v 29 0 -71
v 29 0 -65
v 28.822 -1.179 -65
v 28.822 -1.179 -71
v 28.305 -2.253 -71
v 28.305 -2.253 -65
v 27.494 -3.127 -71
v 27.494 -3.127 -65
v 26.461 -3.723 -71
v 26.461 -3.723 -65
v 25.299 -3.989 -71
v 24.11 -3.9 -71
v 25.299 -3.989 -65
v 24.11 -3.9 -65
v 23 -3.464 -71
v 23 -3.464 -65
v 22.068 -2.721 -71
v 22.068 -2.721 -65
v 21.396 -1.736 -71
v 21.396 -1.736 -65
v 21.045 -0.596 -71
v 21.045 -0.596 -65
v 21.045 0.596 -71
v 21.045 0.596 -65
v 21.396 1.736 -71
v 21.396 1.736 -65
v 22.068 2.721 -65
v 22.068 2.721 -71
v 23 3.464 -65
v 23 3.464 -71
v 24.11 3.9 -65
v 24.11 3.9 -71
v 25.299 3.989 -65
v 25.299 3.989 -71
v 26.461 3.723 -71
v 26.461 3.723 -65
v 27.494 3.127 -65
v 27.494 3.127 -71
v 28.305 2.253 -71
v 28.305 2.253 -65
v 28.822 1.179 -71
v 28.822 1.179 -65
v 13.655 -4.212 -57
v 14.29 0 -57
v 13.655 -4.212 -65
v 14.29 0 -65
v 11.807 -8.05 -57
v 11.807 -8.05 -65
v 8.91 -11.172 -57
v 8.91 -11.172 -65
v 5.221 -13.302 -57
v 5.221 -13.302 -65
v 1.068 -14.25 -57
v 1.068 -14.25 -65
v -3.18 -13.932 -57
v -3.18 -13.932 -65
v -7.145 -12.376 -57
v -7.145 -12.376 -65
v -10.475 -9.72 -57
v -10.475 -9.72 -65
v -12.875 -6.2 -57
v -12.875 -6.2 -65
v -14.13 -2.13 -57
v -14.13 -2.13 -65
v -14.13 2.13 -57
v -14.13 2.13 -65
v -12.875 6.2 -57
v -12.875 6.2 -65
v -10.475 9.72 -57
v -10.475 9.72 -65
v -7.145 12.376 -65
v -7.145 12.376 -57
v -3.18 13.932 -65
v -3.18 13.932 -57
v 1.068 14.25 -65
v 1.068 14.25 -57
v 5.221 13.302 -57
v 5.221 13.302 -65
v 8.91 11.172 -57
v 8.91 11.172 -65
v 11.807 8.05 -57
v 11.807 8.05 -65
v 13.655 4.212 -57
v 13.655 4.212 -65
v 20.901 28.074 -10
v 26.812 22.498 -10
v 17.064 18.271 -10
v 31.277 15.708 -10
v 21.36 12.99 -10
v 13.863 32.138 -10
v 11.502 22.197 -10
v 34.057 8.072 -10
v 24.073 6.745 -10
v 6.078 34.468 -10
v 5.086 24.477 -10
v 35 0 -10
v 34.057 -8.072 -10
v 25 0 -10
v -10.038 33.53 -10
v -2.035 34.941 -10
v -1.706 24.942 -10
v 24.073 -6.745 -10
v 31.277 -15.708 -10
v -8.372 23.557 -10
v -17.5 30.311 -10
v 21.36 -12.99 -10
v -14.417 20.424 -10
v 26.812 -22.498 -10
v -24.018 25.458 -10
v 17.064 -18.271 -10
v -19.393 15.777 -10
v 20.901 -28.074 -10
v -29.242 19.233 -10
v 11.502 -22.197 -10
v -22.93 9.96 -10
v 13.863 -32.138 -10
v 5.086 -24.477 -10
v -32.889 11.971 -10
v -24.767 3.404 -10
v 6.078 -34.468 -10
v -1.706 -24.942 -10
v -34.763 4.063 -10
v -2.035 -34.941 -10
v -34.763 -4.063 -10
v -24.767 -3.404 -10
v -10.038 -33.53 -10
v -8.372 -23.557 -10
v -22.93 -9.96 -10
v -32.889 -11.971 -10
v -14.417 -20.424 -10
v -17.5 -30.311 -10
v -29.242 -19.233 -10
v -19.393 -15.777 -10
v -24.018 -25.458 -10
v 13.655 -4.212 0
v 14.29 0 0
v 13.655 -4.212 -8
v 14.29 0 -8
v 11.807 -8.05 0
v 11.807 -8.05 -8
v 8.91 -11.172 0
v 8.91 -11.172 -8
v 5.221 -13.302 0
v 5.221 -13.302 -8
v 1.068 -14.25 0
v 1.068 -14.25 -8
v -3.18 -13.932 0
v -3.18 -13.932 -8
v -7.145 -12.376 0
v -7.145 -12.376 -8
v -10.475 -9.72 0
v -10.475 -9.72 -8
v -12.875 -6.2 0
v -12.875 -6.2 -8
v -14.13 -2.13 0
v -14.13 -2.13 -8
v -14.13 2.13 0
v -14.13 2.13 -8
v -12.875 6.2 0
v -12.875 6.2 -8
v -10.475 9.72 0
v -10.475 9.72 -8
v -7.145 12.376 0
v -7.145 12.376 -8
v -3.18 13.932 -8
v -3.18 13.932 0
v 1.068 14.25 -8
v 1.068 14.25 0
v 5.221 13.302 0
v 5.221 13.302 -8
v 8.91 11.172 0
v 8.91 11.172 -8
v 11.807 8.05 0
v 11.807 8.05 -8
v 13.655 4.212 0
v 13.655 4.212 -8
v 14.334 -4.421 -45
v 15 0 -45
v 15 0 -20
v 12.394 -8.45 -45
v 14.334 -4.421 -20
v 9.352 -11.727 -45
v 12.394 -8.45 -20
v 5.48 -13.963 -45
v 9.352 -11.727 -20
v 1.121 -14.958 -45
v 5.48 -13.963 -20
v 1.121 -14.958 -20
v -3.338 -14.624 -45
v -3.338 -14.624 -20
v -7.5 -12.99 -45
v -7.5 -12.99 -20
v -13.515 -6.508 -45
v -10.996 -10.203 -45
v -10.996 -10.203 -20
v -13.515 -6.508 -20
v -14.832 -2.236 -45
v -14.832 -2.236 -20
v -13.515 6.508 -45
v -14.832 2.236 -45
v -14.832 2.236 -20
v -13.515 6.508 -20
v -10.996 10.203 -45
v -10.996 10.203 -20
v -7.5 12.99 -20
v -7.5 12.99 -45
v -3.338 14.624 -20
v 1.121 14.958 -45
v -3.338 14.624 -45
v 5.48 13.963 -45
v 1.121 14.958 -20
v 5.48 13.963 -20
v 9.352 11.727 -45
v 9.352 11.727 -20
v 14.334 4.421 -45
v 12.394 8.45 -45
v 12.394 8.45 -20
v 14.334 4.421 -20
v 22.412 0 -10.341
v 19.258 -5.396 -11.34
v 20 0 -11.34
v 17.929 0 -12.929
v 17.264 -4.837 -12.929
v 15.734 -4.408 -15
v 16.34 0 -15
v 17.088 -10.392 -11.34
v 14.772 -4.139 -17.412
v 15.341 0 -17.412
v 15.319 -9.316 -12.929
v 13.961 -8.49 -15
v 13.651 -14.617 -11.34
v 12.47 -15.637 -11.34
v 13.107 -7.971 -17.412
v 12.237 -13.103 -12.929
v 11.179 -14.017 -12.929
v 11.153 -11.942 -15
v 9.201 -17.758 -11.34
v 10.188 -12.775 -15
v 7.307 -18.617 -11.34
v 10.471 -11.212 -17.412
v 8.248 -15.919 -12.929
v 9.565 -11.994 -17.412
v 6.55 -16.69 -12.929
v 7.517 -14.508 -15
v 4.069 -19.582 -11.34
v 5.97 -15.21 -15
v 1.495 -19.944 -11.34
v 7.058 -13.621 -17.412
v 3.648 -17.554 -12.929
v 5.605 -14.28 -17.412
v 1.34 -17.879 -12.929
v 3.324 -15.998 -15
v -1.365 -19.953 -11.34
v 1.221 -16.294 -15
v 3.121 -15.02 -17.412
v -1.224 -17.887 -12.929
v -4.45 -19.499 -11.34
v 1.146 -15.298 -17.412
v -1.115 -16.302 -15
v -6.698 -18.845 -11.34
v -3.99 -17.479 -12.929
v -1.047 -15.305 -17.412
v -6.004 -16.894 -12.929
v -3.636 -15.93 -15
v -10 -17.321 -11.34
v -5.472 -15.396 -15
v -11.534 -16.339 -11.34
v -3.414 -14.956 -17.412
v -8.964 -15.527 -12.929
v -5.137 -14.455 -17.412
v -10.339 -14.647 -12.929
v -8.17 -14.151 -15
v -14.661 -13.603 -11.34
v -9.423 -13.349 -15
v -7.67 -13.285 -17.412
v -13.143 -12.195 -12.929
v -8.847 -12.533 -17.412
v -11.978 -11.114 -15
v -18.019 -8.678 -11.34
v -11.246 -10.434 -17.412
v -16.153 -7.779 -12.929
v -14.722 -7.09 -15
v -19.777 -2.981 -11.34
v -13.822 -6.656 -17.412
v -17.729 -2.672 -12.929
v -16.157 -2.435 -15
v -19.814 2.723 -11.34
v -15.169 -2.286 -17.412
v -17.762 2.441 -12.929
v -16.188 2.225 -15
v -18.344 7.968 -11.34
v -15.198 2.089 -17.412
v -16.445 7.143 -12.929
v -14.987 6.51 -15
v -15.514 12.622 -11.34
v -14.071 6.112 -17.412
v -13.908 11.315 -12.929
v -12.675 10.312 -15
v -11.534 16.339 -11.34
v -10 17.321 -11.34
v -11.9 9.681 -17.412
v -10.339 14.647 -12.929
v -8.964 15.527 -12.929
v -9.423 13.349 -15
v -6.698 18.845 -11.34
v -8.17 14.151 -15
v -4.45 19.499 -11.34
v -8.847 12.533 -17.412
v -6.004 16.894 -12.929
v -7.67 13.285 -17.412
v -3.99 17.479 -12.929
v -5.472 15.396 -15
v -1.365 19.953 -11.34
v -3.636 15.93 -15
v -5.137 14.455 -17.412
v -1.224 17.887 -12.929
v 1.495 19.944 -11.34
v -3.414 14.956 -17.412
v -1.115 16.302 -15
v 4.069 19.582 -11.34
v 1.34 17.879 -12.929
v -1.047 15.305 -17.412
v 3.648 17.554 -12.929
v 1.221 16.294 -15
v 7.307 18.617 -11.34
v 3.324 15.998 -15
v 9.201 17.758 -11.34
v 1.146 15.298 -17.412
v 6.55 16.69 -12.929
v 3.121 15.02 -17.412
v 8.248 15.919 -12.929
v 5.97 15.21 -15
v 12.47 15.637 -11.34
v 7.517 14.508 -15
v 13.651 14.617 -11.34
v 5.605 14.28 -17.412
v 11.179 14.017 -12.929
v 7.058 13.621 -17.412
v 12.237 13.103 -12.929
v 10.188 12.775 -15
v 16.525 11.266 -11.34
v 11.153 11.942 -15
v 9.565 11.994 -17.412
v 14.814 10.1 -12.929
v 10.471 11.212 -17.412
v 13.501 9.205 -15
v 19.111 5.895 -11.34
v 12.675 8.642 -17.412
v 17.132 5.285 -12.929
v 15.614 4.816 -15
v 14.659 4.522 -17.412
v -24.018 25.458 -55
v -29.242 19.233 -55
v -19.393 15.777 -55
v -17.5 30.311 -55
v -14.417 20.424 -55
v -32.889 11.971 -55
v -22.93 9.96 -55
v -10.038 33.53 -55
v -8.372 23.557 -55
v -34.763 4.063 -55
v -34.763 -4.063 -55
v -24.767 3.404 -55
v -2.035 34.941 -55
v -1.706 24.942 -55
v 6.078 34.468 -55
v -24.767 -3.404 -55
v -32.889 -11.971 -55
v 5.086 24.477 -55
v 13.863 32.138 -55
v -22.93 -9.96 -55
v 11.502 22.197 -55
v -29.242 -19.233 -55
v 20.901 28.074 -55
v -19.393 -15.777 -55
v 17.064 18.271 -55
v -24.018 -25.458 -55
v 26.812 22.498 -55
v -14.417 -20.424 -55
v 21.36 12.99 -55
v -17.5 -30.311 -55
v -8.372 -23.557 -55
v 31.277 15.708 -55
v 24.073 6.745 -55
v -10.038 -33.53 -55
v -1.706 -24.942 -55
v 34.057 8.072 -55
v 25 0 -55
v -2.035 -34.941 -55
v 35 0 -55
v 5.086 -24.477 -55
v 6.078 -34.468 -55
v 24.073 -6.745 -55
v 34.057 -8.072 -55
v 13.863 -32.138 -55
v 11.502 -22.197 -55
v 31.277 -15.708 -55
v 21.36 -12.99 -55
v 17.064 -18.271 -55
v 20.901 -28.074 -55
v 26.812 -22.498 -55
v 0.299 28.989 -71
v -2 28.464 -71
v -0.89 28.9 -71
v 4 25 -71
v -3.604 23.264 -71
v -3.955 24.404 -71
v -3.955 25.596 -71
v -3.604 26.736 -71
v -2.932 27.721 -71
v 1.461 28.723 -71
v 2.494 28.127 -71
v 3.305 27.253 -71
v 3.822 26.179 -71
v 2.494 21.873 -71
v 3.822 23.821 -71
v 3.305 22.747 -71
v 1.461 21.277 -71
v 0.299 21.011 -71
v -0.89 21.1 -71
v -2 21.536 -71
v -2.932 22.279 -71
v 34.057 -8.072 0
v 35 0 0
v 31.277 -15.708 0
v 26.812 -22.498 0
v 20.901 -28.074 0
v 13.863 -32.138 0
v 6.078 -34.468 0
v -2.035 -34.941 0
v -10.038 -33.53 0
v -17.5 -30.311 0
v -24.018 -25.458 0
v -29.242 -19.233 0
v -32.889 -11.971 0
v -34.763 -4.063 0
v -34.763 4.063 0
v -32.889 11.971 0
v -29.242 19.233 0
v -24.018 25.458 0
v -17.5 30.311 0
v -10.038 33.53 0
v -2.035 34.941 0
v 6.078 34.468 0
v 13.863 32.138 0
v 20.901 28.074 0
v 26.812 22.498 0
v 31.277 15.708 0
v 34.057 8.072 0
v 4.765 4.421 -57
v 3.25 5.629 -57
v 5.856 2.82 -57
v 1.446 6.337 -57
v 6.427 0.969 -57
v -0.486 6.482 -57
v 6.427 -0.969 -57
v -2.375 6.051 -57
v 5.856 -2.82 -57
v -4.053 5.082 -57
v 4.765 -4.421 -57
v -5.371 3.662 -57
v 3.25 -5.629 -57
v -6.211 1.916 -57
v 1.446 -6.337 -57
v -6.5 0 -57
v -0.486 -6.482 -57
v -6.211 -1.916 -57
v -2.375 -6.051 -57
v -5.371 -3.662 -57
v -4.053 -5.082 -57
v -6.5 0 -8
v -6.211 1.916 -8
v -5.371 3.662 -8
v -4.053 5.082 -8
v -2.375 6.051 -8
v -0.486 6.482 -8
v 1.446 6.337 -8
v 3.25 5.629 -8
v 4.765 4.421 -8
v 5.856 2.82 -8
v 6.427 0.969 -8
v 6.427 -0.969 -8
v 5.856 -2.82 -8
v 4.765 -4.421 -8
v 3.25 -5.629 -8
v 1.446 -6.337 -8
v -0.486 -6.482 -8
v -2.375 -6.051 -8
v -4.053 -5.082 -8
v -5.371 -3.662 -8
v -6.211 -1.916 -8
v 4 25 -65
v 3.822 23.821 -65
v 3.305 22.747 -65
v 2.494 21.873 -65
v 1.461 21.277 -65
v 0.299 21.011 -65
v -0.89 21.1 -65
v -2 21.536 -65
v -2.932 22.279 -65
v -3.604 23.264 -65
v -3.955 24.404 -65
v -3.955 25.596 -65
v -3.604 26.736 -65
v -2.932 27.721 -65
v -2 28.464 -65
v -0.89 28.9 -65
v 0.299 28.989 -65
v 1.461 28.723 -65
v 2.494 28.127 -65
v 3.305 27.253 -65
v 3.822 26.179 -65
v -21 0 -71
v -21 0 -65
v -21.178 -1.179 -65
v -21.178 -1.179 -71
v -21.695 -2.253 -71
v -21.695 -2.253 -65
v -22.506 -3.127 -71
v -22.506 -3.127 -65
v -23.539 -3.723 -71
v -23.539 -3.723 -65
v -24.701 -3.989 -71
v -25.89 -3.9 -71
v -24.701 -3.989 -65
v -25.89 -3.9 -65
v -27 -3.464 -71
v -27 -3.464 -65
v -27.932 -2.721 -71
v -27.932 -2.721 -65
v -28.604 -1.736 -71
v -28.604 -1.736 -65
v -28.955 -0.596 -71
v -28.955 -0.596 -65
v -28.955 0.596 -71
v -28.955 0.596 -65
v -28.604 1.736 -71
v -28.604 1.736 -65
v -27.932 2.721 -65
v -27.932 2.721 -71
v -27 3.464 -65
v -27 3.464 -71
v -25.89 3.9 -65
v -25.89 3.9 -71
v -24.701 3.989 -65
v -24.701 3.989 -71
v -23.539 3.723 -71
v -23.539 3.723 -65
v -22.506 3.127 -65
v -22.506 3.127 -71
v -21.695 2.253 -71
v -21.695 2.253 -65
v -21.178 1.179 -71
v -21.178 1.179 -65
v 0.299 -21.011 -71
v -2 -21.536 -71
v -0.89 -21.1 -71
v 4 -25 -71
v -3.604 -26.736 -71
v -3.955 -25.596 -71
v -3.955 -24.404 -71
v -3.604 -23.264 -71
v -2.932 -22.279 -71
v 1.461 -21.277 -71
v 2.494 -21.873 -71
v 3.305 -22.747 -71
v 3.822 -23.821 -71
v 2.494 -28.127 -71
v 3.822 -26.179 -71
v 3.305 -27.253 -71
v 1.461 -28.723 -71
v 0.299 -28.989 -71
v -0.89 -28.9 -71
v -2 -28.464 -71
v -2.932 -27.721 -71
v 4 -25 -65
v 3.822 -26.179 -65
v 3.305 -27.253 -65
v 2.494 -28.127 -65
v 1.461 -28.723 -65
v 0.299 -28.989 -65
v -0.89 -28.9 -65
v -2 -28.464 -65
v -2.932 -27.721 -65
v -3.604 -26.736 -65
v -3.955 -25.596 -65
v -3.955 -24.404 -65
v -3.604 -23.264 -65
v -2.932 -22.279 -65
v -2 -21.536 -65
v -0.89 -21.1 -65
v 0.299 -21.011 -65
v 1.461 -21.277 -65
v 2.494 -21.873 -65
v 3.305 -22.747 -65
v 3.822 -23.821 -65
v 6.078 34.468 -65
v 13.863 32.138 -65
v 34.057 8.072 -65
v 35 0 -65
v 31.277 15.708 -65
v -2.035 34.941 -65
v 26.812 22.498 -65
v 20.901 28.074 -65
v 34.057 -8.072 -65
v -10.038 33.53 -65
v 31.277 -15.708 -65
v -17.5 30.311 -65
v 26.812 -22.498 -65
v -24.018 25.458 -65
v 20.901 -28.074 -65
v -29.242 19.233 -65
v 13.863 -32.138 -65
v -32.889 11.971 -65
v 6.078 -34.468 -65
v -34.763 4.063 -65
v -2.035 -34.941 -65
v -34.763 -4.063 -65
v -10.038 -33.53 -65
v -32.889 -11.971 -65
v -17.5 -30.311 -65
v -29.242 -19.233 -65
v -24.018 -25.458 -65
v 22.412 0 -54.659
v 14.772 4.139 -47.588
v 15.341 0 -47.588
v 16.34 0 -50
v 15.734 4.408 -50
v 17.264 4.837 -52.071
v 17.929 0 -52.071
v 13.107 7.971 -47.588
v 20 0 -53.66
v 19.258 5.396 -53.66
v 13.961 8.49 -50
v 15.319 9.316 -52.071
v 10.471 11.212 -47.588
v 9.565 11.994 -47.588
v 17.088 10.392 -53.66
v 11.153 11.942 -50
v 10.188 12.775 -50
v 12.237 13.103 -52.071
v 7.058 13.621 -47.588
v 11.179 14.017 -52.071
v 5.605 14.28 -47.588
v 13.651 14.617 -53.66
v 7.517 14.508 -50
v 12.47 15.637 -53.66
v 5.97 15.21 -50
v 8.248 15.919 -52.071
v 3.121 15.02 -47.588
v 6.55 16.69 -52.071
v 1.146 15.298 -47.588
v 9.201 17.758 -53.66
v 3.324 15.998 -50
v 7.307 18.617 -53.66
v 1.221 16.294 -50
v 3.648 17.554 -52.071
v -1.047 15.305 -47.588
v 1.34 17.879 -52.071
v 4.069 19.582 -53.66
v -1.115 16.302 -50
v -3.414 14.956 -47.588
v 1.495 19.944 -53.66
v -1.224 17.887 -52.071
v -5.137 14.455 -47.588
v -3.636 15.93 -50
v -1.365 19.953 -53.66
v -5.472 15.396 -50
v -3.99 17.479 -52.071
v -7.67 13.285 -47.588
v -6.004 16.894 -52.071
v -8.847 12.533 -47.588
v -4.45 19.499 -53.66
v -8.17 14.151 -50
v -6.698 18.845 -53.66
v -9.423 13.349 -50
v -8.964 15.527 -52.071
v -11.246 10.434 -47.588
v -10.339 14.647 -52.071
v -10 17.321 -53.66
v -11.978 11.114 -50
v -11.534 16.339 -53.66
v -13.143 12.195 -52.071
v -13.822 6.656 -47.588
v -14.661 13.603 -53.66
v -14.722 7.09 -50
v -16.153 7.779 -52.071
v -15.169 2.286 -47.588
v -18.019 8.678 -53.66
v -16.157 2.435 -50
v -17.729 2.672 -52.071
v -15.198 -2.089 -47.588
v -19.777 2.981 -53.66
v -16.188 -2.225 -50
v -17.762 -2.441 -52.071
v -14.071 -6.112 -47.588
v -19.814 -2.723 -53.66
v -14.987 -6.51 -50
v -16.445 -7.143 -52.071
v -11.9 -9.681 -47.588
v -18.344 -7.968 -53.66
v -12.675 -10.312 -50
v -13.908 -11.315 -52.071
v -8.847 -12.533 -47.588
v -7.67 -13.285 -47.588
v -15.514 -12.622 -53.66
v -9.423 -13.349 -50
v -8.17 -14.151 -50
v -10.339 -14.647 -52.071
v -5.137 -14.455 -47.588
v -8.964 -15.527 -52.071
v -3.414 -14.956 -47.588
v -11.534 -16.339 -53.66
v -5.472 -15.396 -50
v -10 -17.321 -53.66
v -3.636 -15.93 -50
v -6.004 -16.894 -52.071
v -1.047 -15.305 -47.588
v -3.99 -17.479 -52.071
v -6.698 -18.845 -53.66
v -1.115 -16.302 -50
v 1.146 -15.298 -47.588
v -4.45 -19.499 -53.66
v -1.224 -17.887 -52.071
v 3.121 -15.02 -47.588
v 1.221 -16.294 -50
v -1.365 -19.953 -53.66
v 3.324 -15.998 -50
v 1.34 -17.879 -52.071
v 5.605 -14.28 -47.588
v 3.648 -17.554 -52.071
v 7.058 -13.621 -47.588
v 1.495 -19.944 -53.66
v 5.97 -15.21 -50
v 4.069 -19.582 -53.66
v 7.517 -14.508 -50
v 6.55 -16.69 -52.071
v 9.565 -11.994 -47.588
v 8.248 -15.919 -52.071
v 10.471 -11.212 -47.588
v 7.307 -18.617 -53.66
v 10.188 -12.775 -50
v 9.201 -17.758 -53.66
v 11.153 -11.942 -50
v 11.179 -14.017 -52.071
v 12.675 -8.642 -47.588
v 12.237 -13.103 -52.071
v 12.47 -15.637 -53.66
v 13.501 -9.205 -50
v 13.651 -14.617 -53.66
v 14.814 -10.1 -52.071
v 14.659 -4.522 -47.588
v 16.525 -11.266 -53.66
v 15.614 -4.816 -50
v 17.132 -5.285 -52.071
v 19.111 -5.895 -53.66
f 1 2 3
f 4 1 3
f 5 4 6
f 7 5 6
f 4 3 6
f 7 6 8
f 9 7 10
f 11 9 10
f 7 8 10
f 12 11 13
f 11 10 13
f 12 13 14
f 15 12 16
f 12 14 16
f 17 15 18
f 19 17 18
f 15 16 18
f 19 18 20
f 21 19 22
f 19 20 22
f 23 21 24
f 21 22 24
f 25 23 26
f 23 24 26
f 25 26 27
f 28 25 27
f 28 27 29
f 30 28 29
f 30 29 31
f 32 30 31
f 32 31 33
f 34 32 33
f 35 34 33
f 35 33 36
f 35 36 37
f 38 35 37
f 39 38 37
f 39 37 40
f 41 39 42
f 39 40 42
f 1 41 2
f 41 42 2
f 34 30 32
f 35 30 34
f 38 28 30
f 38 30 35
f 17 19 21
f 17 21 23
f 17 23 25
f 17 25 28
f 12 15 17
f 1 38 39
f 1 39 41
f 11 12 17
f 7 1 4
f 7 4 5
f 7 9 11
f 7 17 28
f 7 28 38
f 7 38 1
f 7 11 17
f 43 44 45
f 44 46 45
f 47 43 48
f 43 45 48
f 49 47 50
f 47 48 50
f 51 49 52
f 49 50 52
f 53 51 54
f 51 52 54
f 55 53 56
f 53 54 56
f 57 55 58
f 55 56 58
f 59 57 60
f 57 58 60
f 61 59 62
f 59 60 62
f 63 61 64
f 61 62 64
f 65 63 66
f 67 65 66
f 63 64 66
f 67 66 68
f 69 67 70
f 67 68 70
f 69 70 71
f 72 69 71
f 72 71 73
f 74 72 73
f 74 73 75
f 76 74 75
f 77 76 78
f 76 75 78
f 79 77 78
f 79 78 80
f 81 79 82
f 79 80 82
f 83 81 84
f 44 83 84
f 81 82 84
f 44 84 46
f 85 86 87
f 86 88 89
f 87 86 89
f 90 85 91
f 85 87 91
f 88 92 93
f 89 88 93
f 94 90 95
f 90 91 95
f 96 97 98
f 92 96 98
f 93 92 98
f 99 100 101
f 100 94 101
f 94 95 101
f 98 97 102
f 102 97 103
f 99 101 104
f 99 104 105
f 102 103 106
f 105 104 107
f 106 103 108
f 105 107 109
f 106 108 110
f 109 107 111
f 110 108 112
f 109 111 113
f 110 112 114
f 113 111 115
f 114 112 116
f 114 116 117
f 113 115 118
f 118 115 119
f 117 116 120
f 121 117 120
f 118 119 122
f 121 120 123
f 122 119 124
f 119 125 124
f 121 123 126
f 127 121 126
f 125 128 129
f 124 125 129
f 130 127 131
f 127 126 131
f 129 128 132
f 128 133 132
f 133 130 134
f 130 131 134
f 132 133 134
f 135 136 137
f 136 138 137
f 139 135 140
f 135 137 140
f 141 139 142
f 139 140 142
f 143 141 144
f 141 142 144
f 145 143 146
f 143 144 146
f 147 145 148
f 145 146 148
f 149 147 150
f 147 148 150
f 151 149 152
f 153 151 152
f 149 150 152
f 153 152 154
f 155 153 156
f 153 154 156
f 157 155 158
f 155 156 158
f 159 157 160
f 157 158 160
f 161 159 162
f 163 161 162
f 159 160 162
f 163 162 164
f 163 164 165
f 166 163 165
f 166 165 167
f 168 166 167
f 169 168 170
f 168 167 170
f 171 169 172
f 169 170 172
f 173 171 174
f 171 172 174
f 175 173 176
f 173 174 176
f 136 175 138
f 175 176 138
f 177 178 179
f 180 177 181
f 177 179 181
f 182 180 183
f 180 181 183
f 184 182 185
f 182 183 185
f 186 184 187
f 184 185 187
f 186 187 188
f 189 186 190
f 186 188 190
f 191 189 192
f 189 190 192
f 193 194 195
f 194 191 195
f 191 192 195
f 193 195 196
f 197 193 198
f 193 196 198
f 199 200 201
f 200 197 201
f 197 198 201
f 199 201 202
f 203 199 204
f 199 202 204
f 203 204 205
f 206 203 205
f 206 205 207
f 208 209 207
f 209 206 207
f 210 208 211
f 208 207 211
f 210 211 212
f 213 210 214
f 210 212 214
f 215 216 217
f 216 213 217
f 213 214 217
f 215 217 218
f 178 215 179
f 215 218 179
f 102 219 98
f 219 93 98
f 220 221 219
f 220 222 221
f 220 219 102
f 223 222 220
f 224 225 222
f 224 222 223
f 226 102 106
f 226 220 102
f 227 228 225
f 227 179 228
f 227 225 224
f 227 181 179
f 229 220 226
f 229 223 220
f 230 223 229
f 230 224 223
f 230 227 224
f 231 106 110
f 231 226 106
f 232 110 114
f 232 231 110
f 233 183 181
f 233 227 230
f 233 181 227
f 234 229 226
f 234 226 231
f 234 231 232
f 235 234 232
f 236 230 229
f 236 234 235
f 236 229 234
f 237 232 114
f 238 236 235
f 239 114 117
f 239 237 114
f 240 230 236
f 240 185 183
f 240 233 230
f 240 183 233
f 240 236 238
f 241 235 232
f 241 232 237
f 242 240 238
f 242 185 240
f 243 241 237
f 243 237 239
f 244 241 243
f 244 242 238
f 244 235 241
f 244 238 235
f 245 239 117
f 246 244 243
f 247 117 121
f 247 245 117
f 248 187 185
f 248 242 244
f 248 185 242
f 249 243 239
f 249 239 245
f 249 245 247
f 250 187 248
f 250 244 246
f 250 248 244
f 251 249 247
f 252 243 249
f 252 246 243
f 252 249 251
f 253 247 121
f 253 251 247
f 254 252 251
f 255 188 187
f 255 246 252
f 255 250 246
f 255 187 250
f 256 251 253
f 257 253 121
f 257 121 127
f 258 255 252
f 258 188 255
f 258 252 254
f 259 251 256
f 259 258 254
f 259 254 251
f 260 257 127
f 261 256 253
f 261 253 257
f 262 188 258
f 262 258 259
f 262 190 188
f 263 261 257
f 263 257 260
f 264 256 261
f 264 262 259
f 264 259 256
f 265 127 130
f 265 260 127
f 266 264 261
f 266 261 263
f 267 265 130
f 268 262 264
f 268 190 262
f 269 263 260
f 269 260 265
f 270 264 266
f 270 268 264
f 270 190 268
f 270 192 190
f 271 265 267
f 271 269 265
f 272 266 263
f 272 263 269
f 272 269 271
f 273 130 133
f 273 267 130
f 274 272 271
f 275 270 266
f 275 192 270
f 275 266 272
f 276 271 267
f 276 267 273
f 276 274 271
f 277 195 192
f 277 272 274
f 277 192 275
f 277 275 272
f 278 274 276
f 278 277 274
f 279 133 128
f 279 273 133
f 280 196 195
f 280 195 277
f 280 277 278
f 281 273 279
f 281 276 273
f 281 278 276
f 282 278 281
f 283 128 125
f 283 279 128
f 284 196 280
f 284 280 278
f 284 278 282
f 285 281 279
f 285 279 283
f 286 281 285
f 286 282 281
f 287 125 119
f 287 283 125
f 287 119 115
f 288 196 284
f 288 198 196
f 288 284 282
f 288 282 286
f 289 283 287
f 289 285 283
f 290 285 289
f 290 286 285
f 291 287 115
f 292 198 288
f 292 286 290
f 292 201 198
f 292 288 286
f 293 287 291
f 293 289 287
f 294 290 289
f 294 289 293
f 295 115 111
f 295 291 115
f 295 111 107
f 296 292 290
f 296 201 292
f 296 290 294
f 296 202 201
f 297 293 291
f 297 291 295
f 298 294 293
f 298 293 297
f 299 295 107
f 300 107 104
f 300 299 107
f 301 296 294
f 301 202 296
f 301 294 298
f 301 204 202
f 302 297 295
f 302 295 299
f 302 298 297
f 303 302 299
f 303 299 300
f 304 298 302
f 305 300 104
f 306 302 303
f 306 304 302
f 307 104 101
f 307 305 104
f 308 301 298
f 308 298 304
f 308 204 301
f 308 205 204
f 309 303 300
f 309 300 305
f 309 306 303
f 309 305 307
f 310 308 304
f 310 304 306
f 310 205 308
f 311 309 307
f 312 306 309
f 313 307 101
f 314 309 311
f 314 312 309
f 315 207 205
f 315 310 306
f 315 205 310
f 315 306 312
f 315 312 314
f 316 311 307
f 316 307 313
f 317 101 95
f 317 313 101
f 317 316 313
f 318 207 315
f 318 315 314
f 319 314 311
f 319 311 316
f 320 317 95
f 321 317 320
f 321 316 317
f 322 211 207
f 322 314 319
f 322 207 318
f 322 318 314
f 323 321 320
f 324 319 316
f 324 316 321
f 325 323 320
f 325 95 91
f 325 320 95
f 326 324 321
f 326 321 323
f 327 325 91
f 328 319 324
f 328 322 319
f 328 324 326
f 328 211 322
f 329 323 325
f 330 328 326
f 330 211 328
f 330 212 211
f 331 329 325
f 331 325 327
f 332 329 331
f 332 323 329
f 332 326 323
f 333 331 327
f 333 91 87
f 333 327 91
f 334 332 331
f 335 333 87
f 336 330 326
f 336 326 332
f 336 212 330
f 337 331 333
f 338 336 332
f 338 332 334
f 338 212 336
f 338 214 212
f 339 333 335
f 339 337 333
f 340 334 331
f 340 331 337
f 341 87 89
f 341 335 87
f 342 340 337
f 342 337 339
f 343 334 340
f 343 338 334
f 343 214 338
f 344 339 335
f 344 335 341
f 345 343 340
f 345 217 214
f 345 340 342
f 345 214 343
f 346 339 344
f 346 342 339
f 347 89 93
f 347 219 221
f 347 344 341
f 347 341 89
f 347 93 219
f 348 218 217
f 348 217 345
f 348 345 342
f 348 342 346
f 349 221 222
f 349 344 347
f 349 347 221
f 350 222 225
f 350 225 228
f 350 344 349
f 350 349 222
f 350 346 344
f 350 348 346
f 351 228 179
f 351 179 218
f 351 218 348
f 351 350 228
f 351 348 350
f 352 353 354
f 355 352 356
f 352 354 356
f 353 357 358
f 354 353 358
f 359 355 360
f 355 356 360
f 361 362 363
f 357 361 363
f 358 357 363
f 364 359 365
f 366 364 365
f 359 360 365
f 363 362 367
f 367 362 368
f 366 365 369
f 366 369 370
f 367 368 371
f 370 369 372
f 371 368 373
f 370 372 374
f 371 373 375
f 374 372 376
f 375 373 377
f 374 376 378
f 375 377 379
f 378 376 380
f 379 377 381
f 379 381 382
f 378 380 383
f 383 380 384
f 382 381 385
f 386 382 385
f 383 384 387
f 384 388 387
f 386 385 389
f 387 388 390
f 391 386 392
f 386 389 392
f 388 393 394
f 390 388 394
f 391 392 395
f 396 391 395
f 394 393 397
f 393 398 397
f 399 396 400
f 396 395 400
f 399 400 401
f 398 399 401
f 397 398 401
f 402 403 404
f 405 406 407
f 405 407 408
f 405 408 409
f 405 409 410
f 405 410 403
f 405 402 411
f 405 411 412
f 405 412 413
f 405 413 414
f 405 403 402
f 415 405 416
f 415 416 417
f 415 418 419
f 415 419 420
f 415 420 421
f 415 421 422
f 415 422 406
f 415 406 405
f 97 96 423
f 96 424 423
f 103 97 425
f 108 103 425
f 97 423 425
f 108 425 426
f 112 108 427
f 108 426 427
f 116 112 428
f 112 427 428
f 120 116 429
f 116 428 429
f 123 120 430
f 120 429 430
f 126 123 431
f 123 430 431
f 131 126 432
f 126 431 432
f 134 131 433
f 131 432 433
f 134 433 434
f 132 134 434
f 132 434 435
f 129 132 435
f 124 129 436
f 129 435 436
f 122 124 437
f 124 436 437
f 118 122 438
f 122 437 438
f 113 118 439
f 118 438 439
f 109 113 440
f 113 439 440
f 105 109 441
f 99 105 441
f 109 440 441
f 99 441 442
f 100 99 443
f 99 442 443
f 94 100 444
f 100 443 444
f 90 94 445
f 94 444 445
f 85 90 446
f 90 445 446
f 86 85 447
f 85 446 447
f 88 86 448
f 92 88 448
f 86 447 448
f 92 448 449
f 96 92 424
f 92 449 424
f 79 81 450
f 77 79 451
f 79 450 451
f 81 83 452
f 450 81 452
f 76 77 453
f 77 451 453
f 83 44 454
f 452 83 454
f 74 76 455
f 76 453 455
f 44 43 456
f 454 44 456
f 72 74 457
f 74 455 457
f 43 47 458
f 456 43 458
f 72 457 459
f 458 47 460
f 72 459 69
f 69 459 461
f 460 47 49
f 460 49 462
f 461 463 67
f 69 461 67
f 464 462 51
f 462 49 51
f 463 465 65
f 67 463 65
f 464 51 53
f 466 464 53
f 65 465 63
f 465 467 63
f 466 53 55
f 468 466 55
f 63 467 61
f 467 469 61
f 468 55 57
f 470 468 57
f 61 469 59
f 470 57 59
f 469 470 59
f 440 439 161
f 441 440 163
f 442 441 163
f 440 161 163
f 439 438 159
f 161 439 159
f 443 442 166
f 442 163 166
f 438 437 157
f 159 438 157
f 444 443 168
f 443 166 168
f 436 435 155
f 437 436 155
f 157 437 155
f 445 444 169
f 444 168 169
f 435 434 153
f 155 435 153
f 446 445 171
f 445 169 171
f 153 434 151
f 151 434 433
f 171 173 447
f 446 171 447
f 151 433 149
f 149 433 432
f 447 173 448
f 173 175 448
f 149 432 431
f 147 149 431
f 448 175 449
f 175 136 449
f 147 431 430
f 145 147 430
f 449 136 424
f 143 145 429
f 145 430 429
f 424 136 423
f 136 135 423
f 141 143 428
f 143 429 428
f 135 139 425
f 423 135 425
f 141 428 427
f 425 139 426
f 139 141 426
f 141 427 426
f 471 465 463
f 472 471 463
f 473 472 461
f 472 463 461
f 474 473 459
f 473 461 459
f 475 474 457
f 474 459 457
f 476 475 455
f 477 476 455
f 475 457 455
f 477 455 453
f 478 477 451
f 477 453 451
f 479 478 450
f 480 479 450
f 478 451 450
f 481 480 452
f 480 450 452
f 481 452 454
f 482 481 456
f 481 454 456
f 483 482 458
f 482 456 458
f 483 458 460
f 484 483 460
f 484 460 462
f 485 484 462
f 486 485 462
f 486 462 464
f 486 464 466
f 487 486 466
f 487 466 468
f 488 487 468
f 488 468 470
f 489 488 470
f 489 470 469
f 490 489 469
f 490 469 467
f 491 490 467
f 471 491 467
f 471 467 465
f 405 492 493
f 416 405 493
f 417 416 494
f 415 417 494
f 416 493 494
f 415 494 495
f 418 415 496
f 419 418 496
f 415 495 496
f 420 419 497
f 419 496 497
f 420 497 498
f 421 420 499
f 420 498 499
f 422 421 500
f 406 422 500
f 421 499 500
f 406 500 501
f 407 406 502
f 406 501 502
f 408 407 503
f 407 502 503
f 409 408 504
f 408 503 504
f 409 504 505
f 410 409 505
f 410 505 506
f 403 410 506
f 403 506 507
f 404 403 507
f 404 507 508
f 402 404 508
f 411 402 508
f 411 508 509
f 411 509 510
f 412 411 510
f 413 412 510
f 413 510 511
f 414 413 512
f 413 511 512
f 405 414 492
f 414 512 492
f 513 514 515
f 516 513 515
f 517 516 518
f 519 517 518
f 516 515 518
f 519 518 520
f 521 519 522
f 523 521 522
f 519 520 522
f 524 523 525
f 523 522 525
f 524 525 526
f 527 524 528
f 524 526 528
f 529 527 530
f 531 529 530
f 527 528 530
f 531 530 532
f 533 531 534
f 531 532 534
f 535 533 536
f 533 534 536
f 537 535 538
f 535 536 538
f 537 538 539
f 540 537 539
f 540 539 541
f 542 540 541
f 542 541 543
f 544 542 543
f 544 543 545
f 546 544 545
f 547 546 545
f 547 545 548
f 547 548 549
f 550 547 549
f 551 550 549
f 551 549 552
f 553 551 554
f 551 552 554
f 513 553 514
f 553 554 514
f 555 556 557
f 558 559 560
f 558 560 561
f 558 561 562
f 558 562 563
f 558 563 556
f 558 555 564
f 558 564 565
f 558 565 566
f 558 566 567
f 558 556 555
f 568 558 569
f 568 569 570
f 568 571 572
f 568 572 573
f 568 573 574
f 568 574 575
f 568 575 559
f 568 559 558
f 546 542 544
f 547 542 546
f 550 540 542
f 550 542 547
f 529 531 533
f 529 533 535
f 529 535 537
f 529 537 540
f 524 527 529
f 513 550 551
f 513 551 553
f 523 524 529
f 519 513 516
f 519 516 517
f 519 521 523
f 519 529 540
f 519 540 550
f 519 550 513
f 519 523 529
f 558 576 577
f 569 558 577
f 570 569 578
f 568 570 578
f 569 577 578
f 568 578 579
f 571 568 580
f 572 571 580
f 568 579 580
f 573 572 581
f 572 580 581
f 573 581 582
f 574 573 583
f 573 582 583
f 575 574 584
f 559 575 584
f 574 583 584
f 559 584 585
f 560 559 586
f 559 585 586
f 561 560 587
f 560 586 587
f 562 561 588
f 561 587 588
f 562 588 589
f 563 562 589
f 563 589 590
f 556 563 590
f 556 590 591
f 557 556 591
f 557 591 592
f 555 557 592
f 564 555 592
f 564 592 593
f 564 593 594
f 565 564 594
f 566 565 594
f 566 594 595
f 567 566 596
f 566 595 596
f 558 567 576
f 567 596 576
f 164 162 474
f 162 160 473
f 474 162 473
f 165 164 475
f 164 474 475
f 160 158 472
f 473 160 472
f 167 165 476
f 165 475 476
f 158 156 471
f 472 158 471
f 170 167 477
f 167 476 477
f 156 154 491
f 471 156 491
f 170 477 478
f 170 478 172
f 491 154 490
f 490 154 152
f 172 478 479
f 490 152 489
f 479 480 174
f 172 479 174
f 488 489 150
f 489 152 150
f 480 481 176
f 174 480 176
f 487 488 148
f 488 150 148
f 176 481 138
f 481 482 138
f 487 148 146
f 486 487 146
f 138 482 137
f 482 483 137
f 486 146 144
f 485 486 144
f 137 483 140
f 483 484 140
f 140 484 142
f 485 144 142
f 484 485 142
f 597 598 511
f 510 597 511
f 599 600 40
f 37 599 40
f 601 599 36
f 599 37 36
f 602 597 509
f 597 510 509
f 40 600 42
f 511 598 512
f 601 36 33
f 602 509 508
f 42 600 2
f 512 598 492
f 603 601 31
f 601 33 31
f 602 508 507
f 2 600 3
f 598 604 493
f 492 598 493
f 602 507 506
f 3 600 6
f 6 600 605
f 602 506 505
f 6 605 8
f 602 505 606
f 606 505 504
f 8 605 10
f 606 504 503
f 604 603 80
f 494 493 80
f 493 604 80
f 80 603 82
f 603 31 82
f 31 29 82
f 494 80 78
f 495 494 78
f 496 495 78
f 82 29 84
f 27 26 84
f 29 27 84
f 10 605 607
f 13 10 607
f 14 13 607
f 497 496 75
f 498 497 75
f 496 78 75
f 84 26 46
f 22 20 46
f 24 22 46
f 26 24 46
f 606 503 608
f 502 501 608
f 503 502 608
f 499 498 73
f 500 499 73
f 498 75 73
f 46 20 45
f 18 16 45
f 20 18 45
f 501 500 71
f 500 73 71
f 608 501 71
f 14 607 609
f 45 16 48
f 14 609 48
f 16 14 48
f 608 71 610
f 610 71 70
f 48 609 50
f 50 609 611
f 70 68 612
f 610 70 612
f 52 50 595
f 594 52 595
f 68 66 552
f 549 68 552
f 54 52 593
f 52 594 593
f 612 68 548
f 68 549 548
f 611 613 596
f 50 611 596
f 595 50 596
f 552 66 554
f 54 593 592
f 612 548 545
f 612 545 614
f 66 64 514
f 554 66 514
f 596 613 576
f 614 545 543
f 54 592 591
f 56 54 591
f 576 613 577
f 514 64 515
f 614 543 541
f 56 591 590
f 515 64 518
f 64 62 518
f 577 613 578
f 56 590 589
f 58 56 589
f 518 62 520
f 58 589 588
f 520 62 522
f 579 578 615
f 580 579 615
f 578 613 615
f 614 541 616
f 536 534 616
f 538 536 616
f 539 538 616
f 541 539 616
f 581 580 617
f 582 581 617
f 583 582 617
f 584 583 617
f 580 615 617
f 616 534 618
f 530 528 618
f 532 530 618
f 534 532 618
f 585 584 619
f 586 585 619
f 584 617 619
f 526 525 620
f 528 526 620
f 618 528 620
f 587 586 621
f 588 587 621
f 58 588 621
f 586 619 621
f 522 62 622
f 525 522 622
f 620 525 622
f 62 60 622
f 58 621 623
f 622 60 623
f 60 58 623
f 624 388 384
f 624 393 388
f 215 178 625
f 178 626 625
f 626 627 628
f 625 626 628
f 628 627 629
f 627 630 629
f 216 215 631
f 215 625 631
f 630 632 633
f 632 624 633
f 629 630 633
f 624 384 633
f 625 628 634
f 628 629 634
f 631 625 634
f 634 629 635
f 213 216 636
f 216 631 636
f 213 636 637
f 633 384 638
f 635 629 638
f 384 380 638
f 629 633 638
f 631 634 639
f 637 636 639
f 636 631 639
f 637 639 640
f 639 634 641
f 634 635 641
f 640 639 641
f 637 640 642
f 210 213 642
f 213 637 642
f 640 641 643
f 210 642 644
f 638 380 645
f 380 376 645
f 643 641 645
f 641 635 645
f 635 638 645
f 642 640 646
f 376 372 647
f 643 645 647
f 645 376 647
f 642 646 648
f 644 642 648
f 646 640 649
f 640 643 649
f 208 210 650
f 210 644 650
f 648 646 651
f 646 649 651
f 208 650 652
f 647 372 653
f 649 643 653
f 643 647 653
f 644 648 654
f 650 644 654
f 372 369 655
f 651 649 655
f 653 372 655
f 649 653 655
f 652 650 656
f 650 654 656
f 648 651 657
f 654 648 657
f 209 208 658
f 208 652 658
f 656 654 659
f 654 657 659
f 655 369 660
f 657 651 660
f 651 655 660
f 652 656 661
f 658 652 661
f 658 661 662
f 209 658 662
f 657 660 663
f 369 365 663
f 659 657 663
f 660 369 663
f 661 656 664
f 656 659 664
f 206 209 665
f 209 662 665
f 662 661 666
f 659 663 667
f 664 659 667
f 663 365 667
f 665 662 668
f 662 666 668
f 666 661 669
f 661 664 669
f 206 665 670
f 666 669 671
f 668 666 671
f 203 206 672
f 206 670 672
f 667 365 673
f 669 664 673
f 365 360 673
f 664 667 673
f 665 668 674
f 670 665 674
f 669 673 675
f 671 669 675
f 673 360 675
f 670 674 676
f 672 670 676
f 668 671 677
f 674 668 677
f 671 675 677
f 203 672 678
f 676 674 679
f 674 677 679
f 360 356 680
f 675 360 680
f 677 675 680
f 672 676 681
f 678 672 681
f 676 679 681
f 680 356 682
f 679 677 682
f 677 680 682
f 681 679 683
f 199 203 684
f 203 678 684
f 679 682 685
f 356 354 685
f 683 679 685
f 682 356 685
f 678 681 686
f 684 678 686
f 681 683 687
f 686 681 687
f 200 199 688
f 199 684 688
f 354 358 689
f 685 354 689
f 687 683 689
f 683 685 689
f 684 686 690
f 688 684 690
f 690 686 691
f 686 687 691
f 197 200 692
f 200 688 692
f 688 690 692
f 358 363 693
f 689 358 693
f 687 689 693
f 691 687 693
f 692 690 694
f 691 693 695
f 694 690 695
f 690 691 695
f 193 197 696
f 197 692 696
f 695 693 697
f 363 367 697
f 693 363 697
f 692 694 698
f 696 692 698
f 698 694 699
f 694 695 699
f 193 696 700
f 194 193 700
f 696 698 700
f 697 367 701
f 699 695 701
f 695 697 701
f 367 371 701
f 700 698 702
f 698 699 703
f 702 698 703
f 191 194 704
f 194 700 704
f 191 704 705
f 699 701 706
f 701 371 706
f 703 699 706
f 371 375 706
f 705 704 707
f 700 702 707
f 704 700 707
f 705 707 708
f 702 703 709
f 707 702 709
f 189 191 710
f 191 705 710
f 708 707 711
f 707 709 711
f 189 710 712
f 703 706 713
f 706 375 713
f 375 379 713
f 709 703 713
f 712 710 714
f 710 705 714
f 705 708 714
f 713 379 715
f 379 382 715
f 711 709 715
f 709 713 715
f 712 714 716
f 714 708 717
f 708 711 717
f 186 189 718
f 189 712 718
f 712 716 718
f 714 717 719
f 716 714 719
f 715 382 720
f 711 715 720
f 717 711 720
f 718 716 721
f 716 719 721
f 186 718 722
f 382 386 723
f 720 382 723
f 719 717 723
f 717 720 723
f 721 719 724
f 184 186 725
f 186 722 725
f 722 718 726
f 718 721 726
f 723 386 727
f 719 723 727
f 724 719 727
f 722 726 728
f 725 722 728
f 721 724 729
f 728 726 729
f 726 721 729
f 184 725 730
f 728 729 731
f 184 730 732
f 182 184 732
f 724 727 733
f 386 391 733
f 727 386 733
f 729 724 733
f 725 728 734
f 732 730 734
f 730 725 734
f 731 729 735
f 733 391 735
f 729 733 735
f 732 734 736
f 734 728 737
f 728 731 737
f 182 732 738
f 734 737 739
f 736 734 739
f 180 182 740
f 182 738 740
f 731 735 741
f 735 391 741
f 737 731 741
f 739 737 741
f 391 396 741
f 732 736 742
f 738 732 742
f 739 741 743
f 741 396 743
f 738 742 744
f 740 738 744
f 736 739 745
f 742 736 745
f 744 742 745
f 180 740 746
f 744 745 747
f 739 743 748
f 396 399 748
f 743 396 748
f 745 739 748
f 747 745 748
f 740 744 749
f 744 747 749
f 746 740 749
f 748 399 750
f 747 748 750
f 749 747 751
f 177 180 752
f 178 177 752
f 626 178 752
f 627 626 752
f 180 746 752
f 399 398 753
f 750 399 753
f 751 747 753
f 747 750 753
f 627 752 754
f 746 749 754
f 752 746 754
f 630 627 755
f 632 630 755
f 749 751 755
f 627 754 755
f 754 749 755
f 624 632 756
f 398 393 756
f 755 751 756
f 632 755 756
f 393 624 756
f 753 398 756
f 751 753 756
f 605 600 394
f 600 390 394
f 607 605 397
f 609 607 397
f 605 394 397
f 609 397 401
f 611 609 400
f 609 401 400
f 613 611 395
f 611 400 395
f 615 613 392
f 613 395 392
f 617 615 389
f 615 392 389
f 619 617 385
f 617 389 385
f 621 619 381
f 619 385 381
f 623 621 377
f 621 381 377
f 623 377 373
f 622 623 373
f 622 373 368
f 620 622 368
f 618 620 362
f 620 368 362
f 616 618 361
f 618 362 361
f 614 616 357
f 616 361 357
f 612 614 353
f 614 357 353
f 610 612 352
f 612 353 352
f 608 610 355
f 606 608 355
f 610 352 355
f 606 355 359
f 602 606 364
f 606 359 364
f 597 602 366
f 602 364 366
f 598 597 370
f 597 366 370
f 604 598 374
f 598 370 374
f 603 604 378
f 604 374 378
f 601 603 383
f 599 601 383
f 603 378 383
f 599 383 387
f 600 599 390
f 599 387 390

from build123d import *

# Parameters (mm, degrees)
ESQUISSE28_R             = 6.5
ENL_V_MAT_EXTRU_16_DEPTH = 76.4917214
CONG_1_R                 = 10
ESQUISSE29_R             = 4
BOSS_EXTRU_1_DEPTH       = 6
ESQUISSE30_R             = 19.501187477
ESQUISSE30_R_2           = 15
BOSS_EXTRU_2_DEPTH       = 9.735855
CONG_2_R                 = 10


with BuildPart() as part:
    # Esquisse27 → Révolution1 (revolve)
    with BuildSketch(Plane(origin=(0, 0, 0), x_dir=(0, 0, -1), z_dir=(1, 0, 0)), mode=Mode.PRIVATE) as r_volution1_sk:
        Polygon((8, 14.29), (8, 0), (57, 0), (57, 14.29), (65, 14.29), (65, 35), (55, 35), (55, 19.501187477), (64.735853824, 19.501187477), (64.735853824, 15), (10, 15), (10, 35), (0, 35), (0, 14.29), align=None)
    revolve(r_volution1_sk.sketch.rotate(Axis((0, 0, -10), (0, 0, -1)), 90), axis=Axis((0, 0, -10), (0, 0, -1)))

    # Esquisse28 → Enlèv. mat.-Extru.16 (cut, through all)
    with BuildSketch(Plane(origin=(0, 0, -57), x_dir=(-1, 0, 0), z_dir=(0, 0, -1))):
        Circle(ESQUISSE28_R)
    extrude(amount=-ENL_V_MAT_EXTRU_16_DEPTH, mode=Mode.SUBTRACT)

    # Congé1
    cong_1_edges = [part.edges().sort_by_distance(p)[0] for p in [
        (-15, 0, -10),
    ]]
    fillet(cong_1_edges, radius=CONG_1_R)

    # Esquisse29 → Boss.-Extru.1 (add)
    with BuildSketch(Plane(origin=(0, 0, -65), x_dir=(-1, 0, 0), z_dir=(0, 0, -1))):
        with Locations(Location((0, 25, 0), (0, 0, 180))):
            Circle(ESQUISSE29_R)
        with Locations(Location((25, 0, 0), (0, 0, 180))):
            Circle(ESQUISSE29_R)
        with Locations(Location((0, -25, 0), (0, 0, 180))):
            Circle(ESQUISSE29_R)
        with Locations(Location((-25, 0, 0), (0, 0, 180))):
            Circle(ESQUISSE29_R)
    extrude(amount=BOSS_EXTRU_1_DEPTH)

    # Esquisse30 → Boss.-Extru.2 (add)
    with BuildSketch(Plane.XY.offset(-64.735853824)):
        Circle(ESQUISSE30_R)
        Circle(ESQUISSE30_R_2, mode=Mode.SUBTRACT)
    extrude(amount=BOSS_EXTRU_2_DEPTH)

    # Congé2
    # the kernel refuses this fillet: 10 mm, written as the material it adds along each edge
    with BuildSketch(Plane(origin=(0, 0, -54.999998824), x_dir=(1, 0, 0), z_dir=(0, -1, 0))) as cong_2_piece_1:
        with BuildLine():
            CenterArc((15 + CONG_2_R, CONG_2_R), CONG_2_R, 180, 90)
            Line((15 + CONG_2_R, 0), (15 + CONG_2_R, -CONG_2_R * 0.02))
            Line((15 + CONG_2_R, -CONG_2_R * 0.02), (15 - CONG_2_R * 0.02, -CONG_2_R * 0.02))
            Line((15 - CONG_2_R * 0.02, -CONG_2_R * 0.02), (15 - CONG_2_R * 0.02, CONG_2_R))
            Line((15 - CONG_2_R * 0.02, CONG_2_R), (15, CONG_2_R))
        make_face()
    revolve(axis=Axis((0, 0, -54.999998824), (0, 0, 1)))


solid = part.part
